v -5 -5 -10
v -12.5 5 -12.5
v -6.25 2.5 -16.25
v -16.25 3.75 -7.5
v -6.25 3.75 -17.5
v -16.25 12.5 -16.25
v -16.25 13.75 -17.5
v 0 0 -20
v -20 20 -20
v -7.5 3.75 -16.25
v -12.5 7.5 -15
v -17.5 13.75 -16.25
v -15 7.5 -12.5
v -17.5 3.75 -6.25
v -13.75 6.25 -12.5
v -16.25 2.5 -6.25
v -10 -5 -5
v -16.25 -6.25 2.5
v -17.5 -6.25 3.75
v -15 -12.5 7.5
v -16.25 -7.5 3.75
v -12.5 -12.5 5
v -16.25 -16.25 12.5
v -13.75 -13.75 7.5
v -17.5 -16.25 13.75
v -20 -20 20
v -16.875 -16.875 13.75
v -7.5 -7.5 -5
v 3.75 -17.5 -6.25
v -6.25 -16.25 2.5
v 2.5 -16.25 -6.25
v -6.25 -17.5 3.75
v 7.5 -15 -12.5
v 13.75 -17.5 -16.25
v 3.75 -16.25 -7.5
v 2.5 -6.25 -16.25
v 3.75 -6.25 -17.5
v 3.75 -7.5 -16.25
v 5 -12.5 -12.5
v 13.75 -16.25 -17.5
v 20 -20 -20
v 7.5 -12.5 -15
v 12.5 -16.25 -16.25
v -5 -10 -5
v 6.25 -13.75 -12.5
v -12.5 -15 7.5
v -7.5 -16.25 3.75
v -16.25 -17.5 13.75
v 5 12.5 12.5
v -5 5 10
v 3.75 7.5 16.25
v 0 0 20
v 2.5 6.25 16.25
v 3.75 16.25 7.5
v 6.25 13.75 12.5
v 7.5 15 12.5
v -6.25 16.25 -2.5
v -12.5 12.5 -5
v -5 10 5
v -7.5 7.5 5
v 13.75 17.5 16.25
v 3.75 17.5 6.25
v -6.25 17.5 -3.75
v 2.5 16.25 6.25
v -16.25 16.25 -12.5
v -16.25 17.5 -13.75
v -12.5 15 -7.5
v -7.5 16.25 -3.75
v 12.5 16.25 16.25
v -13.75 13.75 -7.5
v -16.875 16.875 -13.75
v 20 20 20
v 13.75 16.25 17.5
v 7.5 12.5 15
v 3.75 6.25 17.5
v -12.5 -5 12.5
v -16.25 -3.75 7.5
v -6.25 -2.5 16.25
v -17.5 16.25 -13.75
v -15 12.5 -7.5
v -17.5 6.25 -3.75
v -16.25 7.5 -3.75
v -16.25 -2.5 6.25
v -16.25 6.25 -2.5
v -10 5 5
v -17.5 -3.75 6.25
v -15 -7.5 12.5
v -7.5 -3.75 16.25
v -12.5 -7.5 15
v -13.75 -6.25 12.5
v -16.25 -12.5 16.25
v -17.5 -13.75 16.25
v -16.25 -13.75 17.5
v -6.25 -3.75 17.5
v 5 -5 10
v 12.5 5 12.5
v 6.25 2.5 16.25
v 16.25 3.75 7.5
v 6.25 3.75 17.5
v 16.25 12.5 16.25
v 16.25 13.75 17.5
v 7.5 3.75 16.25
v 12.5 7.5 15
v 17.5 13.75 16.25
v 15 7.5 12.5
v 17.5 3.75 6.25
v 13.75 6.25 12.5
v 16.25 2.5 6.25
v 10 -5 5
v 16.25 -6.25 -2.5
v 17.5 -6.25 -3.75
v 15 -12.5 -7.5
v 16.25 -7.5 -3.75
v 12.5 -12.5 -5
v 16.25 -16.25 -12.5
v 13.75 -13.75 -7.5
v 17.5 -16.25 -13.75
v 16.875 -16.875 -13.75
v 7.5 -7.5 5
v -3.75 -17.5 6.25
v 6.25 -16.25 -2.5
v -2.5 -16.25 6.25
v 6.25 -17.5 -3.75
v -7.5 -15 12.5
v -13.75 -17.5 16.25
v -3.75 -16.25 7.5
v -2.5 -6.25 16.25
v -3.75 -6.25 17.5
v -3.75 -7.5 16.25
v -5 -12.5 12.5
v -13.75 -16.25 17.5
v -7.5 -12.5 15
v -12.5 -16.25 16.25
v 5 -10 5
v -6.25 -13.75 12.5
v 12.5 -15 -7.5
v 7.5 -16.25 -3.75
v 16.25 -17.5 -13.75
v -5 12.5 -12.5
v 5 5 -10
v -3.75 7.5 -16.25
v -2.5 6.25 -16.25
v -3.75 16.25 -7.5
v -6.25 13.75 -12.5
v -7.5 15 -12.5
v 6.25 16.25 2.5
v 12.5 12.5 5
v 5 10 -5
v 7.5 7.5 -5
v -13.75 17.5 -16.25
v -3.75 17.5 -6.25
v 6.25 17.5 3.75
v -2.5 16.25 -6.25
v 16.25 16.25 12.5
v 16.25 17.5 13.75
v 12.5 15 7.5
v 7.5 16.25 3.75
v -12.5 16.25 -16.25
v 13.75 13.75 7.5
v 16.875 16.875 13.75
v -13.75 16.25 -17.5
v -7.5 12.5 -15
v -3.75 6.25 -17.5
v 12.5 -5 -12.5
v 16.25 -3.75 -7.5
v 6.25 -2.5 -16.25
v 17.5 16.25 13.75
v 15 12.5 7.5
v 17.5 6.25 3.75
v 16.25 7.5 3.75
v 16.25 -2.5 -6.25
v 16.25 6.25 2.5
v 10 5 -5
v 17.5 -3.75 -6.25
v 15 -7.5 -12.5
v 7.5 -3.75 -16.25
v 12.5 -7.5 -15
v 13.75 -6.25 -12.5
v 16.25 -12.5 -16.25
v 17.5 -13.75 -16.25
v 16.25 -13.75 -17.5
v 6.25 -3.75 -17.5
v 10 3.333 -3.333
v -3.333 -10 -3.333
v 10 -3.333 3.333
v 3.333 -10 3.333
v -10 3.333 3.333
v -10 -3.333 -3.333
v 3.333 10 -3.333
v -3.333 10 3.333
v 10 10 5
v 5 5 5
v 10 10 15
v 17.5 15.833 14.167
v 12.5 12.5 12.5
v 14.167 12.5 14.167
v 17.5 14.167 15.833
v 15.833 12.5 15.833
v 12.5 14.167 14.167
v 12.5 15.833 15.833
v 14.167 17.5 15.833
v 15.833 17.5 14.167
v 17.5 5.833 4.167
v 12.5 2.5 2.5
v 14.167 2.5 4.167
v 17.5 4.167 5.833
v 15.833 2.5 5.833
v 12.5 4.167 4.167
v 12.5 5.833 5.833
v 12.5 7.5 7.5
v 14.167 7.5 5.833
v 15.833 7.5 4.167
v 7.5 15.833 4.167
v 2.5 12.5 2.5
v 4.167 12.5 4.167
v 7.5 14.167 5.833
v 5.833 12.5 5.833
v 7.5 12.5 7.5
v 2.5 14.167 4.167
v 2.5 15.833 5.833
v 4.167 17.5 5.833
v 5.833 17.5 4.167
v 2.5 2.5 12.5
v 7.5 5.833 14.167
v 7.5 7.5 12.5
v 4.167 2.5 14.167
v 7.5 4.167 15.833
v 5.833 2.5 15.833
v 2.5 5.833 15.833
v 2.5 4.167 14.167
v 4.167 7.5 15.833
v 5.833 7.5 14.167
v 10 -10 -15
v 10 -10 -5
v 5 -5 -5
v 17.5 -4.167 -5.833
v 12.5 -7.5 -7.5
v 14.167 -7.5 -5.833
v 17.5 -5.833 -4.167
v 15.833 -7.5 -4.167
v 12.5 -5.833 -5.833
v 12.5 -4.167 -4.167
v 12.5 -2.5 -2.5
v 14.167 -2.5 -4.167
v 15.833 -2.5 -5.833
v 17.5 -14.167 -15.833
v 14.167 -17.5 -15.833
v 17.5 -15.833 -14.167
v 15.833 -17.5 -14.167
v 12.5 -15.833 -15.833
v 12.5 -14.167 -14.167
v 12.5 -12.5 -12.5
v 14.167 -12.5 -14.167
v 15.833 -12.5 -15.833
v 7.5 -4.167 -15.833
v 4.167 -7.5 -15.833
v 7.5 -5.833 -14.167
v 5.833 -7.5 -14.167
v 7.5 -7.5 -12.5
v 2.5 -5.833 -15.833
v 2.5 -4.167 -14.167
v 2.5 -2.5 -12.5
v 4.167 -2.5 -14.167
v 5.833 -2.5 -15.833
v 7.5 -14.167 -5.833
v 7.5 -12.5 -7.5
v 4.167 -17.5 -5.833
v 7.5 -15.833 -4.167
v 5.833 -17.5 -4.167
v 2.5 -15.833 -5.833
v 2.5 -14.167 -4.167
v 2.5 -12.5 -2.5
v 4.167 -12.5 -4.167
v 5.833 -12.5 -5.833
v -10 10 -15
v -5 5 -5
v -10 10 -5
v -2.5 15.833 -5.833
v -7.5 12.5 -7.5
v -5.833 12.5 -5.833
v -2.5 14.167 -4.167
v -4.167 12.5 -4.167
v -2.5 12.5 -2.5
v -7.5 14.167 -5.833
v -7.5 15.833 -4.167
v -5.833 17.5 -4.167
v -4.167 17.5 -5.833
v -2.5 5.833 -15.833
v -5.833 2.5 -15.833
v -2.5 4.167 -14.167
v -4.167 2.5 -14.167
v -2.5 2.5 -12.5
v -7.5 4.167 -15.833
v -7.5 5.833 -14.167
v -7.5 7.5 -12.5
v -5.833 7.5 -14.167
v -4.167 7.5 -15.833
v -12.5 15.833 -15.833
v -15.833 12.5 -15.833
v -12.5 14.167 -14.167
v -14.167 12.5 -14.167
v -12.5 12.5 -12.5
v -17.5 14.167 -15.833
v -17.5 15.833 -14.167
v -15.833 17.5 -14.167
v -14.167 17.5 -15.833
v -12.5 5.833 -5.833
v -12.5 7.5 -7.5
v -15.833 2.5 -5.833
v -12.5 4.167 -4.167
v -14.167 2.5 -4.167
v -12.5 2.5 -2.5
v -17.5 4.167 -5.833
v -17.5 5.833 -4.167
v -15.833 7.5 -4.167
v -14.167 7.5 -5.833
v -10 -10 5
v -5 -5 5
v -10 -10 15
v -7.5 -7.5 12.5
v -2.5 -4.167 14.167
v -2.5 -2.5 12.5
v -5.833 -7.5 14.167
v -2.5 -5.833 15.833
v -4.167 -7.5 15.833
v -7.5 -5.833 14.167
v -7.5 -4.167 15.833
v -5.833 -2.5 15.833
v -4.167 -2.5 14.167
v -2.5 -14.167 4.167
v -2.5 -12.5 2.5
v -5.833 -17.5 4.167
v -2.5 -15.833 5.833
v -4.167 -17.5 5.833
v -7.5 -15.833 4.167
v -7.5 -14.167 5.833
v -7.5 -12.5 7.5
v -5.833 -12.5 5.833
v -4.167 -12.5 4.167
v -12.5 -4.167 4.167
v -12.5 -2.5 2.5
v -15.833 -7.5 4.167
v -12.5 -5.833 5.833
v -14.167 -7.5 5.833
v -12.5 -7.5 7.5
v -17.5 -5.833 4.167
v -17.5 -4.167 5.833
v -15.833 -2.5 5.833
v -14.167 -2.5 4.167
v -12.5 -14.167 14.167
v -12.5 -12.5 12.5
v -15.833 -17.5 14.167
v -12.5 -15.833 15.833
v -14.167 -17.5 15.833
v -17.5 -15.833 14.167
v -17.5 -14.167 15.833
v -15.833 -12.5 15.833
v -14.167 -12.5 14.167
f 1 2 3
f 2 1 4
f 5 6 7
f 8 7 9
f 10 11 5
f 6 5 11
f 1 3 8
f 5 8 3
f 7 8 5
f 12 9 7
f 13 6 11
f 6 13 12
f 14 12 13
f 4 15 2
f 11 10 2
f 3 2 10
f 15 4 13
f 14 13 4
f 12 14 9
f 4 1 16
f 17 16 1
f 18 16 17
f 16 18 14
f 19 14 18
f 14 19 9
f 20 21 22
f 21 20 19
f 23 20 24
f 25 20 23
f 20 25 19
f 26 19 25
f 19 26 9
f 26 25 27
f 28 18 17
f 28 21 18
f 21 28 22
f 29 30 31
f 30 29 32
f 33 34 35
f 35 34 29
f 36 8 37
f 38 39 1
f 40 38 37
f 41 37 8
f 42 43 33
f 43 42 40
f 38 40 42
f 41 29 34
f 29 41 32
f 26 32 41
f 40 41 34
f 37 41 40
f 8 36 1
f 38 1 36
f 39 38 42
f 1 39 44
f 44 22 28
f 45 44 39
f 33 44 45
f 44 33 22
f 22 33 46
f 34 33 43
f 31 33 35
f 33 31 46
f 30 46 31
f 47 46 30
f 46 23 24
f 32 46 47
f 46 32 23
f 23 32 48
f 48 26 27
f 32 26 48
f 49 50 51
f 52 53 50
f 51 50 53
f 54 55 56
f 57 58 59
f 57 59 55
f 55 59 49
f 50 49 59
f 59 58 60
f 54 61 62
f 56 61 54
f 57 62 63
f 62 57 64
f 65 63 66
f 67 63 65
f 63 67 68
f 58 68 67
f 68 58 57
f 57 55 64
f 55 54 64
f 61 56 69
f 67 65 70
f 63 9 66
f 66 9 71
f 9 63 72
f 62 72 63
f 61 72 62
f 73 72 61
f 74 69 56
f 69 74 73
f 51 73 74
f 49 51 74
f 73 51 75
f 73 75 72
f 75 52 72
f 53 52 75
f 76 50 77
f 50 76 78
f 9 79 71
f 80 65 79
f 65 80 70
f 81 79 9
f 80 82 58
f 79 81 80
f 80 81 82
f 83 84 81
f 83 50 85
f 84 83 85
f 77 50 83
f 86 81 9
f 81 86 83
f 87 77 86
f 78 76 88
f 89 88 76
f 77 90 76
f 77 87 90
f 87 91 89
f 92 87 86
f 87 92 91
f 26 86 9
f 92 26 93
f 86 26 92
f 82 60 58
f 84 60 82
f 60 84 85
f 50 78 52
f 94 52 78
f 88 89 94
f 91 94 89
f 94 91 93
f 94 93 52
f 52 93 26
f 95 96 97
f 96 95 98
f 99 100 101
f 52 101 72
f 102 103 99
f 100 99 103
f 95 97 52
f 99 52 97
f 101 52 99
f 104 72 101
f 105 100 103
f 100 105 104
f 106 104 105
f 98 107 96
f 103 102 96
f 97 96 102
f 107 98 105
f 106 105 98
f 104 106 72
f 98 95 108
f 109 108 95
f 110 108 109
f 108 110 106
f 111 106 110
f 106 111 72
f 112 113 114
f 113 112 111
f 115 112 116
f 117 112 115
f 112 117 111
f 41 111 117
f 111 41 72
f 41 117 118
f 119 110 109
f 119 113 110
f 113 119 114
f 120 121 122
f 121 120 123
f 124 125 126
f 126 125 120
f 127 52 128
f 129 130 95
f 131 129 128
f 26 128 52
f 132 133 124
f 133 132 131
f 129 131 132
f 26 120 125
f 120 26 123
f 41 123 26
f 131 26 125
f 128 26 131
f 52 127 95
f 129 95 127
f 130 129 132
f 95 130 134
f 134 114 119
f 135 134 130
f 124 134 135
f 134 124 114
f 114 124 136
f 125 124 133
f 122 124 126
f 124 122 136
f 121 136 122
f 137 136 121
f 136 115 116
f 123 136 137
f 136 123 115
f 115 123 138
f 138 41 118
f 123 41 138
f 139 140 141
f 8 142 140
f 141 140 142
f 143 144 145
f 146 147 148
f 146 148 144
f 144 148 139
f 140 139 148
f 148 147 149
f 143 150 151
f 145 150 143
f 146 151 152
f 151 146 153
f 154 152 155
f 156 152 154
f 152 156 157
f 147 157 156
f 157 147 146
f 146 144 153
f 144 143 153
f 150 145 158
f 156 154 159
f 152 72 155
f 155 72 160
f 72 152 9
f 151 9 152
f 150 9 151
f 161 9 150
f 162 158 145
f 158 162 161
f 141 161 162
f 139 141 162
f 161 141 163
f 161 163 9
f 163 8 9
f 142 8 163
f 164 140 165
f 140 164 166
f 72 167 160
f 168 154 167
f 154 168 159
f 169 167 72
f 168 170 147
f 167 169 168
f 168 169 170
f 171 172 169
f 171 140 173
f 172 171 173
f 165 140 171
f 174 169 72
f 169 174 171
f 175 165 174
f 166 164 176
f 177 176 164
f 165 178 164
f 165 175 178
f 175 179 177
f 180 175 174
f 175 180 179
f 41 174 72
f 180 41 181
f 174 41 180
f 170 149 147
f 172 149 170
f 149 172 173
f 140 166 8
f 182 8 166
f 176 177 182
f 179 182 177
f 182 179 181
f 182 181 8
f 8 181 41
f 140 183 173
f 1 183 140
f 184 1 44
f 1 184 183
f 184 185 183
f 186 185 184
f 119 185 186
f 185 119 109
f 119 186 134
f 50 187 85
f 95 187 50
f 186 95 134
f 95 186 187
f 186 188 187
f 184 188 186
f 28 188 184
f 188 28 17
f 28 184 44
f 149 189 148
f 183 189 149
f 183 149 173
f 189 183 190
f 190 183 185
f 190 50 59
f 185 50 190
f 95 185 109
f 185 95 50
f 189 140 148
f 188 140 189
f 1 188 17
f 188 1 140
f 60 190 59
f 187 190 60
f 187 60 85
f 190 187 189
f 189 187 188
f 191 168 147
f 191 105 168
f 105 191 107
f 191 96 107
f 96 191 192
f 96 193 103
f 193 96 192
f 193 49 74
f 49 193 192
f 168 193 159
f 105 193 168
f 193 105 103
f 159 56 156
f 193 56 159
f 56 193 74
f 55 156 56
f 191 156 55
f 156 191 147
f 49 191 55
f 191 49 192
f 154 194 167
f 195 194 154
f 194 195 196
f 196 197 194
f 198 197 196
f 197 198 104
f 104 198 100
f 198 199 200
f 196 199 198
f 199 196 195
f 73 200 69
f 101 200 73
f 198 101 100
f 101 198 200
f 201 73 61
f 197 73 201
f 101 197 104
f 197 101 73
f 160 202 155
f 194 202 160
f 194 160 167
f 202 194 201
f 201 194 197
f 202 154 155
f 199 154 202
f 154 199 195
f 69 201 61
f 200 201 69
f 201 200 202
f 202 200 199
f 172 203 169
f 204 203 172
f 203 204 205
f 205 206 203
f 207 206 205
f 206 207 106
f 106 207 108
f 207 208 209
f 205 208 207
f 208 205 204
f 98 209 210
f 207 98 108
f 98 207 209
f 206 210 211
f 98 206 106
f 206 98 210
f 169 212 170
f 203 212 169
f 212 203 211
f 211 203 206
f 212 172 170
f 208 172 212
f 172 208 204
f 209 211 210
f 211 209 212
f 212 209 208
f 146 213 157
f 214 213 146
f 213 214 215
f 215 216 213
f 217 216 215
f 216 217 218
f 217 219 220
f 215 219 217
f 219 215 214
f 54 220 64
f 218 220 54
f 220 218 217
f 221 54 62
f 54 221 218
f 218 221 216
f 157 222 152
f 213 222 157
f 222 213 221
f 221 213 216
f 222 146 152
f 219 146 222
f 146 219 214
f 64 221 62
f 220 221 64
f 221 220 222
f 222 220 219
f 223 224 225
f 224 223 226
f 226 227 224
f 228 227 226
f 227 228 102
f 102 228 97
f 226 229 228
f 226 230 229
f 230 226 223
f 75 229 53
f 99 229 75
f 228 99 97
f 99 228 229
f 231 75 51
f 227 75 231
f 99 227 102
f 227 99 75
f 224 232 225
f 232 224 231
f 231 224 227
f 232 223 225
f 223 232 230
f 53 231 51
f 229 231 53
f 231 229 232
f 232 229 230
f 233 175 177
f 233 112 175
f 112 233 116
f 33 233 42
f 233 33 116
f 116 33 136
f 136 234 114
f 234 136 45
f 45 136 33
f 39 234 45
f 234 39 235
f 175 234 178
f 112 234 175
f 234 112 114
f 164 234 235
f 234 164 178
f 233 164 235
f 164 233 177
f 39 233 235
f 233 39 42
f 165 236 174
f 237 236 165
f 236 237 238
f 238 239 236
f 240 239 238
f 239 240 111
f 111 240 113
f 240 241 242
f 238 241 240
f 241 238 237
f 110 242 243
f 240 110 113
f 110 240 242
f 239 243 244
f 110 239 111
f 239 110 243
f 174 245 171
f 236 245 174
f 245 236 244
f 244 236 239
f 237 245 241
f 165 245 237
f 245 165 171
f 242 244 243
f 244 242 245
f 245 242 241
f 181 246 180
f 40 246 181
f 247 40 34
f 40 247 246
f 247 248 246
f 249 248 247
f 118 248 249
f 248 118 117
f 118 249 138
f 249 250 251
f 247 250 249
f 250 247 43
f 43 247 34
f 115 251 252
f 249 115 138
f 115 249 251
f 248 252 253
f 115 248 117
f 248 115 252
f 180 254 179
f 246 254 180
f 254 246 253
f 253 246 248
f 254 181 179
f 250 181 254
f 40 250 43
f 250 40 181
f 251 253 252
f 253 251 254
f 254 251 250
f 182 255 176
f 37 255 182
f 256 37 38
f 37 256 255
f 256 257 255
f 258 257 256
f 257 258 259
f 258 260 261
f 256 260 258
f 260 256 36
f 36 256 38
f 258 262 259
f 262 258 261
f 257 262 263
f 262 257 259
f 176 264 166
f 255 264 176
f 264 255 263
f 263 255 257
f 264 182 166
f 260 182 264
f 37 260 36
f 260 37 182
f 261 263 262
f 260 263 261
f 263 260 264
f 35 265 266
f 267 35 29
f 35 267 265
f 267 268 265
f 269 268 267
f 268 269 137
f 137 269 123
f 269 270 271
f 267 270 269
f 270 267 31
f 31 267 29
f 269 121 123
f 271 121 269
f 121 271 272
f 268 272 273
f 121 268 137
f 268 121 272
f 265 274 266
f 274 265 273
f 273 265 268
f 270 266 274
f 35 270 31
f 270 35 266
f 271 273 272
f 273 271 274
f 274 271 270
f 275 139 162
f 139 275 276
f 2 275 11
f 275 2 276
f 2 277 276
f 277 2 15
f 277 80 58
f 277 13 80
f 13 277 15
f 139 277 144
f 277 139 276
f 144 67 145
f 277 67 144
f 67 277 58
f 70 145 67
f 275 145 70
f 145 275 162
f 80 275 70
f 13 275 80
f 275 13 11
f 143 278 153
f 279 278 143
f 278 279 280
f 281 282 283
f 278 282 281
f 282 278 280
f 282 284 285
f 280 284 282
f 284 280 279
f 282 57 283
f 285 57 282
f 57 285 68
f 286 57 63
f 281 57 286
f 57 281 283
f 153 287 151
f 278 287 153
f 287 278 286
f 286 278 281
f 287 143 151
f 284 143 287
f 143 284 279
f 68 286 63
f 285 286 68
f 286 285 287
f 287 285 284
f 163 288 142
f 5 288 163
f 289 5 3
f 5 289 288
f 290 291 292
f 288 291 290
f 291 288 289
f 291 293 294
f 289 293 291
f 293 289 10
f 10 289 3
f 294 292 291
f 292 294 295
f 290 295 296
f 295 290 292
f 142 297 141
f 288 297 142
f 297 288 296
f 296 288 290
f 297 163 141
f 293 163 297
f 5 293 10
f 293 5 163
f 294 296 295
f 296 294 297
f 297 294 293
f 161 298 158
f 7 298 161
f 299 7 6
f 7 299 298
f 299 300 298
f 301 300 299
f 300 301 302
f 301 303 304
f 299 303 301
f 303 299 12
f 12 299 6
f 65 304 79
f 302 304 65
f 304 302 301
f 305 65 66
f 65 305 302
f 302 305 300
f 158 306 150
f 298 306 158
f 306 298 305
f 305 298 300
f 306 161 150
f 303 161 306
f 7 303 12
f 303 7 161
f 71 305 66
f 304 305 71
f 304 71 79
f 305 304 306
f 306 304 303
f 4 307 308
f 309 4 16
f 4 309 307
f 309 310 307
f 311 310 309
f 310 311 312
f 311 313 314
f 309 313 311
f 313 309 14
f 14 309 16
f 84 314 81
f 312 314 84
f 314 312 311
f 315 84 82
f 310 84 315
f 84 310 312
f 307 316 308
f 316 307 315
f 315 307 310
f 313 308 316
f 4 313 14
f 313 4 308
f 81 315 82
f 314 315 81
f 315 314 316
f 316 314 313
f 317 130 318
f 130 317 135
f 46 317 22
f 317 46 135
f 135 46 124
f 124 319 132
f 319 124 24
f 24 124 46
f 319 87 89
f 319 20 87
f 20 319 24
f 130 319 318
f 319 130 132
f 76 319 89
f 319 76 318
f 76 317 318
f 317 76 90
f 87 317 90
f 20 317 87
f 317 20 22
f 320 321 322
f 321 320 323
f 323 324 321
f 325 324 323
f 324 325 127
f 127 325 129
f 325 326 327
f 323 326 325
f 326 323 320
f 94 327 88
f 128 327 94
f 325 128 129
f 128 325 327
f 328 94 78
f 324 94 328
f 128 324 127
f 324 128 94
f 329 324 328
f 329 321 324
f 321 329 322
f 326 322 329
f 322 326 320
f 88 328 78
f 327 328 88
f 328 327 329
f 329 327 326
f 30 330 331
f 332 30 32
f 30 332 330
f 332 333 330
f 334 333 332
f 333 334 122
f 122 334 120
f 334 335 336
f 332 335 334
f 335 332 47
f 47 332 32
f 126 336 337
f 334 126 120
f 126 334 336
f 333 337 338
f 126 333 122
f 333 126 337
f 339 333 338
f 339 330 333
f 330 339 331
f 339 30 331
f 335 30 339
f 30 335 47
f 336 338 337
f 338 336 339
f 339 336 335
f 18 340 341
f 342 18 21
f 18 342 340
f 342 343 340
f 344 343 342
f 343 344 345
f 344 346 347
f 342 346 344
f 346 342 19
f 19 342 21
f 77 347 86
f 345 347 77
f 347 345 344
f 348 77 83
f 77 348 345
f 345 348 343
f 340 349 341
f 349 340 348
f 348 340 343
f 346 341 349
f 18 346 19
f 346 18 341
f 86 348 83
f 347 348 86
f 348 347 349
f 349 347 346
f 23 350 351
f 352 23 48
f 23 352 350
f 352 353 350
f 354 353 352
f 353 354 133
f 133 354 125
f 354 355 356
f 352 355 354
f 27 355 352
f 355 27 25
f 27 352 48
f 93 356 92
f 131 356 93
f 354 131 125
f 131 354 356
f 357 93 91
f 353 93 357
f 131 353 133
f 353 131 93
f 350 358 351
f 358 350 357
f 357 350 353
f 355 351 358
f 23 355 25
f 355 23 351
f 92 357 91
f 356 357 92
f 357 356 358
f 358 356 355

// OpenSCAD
// Sierpinski tetrahedron fractal — subtractive
// Starts with a solid tetrahedron, recursively subtracts inverted half-scale
// tetrahedra at the center of each surviving sub-region.
// NOTE: F5 preview fails at level ≥3 due to CSG normalization explosion.
// Use the additive version (sierpinski.scad) for standard OpenSCAD preview.

level = 3;

// Tetrahedron via intersection of 4 rotated+translated cubes, centered at origin.
module tetrahedron(edge) {
  big = edge * 2;
  r = edge * sqrt(6) / 12;
  off = big / 2 - r;

  a1 = acos(1 / sqrt(3));
  a2 = acos(-1 / sqrt(3));

  n0 = [1, 1, 1] / sqrt(3);
  n1 = [1, -1, -1] / sqrt(3);
  n2 = [-1, 1, -1] / sqrt(3);
  n3 = [-1, -1, 1] / sqrt(3);

  intersection() {
    translate(off * n0) rotate(a=a1, v=[-1, 1, 0])  cube(big, center=true);
    translate(off * n1) rotate(a=a2, v=[1, 1, 0])   cube(big, center=true);
    translate(off * n2) rotate(a=a2, v=[-1, -1, 0]) cube(big, center=true);
    translate(off * n3) rotate(a=a1, v=[1, -1, 0])  cube(big, center=true);
  }
}

// Collect all voids: at each level, an inverted half-scale tetrahedron at center,
// then recurse into the 4 corner sub-tetrahedra.
// rotate([0,0,90]) maps the tetrahedron to its dual (inverted) orientation.
module sierpinski_holes(edge, lvl) {
  if (lvl > 0) {
    rotate([0, 0, 90]) tetrahedron(edge / 2);

    // Corner sub-tetrahedra centers: halfway from origin to each vertex
    // Circumradius R = edge * sqrt(6) / 4, offset = R / 2
    d = edge * sqrt(6) / 8;
    for (n = [[1,1,1], [1,-1,-1], [-1,1,-1], [-1,-1,1]])
      translate(d * n / sqrt(3))
        sierpinski_holes(edge / 2, lvl - 1);
  }
}

edge = 40 * sqrt(2);

color("goldenrod")
difference() {
  tetrahedron(edge);
  sierpinski_holes(edge, level);
}
